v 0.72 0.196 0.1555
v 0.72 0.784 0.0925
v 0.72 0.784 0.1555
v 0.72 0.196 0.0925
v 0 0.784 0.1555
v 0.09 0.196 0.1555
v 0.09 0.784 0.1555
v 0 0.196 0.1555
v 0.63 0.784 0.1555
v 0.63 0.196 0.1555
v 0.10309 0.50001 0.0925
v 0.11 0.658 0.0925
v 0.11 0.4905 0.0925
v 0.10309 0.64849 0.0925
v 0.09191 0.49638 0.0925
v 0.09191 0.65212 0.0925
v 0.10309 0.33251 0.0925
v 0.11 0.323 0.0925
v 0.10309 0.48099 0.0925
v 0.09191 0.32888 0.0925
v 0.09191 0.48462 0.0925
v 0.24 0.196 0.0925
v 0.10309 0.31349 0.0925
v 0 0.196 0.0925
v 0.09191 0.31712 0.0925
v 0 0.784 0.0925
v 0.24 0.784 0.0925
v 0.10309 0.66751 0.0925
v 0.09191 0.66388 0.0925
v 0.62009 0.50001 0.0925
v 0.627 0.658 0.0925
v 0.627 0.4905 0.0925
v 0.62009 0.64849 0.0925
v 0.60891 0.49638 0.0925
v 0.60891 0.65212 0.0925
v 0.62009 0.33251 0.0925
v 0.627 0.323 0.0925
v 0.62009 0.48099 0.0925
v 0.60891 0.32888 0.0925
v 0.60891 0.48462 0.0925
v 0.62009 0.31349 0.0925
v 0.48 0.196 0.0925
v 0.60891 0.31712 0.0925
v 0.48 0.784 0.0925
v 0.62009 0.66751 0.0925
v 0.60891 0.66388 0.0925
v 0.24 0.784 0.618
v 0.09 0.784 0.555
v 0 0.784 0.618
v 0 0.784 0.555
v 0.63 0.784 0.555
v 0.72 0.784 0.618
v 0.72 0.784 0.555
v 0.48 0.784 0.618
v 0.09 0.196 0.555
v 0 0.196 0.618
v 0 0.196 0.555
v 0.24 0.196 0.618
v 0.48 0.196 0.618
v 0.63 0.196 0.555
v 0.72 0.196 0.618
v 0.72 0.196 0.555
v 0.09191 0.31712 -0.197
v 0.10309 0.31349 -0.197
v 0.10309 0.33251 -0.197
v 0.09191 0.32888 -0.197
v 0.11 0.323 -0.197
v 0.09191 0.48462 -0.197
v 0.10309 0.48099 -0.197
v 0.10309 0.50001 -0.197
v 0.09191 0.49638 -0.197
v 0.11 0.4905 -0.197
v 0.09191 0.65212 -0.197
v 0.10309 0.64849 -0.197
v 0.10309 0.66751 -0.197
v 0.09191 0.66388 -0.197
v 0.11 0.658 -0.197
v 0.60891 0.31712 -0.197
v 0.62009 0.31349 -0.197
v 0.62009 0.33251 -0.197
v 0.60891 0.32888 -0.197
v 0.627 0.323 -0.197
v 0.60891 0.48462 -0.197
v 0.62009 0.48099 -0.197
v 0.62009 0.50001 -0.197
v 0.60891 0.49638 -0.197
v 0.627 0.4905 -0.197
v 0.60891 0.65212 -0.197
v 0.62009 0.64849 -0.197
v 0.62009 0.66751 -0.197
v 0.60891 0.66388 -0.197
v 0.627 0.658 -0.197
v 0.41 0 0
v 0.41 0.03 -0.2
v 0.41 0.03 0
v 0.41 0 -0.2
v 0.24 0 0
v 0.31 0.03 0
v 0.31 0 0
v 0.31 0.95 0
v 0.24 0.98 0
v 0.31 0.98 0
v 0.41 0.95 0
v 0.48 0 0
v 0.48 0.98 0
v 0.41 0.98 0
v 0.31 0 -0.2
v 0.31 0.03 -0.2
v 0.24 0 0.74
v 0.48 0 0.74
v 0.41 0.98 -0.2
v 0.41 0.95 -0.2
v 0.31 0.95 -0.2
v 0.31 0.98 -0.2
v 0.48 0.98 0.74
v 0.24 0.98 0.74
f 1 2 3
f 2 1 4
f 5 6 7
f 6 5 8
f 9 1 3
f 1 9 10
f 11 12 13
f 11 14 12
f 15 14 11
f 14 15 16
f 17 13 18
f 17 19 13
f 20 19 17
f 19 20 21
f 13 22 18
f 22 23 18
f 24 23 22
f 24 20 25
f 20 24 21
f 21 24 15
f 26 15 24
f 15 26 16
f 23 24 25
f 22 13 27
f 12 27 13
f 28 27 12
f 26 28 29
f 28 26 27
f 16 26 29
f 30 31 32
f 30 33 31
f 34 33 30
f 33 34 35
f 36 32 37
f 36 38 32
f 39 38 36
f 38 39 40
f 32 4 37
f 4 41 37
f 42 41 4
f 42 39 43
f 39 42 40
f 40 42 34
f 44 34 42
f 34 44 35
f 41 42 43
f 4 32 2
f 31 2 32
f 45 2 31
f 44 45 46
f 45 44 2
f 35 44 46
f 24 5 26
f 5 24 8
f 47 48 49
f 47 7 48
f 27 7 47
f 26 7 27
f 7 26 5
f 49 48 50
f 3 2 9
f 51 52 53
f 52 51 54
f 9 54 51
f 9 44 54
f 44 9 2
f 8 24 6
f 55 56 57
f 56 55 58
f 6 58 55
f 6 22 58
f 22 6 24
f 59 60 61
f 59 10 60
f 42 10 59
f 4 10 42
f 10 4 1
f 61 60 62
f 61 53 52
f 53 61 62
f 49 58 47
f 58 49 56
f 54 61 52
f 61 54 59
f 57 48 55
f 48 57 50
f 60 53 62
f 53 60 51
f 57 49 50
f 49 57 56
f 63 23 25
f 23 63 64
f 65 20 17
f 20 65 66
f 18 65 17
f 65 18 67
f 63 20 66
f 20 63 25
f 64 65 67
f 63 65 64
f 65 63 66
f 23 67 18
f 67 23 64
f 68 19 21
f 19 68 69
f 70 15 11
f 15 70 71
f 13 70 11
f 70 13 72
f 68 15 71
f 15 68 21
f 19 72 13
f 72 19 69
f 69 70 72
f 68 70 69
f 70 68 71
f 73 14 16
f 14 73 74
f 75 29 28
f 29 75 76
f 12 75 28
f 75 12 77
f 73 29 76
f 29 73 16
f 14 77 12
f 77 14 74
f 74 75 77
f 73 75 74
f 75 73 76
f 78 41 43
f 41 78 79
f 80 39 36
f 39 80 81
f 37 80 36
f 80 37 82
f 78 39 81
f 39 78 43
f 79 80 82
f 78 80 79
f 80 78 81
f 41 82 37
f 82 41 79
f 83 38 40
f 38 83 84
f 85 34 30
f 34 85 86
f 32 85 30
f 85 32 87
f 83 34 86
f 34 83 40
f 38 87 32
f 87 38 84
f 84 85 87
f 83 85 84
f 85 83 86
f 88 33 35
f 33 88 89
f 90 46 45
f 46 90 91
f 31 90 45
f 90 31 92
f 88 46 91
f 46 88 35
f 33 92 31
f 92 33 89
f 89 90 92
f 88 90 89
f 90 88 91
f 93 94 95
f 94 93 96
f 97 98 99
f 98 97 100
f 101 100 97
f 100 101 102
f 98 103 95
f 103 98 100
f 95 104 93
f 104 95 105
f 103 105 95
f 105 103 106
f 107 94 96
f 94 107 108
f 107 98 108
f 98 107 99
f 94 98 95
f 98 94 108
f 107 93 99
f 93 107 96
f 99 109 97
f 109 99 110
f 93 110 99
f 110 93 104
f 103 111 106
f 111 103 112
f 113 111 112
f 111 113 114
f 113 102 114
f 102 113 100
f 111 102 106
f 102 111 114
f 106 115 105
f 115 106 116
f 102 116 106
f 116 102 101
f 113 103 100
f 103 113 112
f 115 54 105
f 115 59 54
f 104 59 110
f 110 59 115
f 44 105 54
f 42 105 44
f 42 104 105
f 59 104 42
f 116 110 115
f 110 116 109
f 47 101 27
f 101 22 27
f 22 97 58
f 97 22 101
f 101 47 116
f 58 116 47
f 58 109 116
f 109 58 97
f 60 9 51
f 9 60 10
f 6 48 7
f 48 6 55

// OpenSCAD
// 42TU transformer

dy = .1675;
dx = .517;

cx = 0.72;
cy = 0.98;
cz = 0.74;

module trans() {
  // body
  color("grey")
    translate( [cx/3, 0, 0])
      cube( [cx/3, cy, cz]);
  color("#e0e0e0") {
      translate( [0, cy/5, cz/8])  cube( [cx, cy*3/5, 0.063]);
      translate( [0, cy/5, cz*6/8])  cube( [cx, cy*3/5, 0.063]);
  }
  color("#ffffe0") {
    translate( [cx/8, cy/5, cz/8])  cube( [cx*3/4, cy*3/5, cz*5/8]);
  }

  // wires
  translate( [0.1, 0.323, -.197]) {
    for( ix=[0:1]) {
      for( iy=[0:2]) {
	translate( [ix*dx, iy*dy, 0])
	  cylinder( d=.02, h=.3);
      }
    }
  }

  // tabs
  color("#e0e0e0") {
    translate( [cx/2-.05, 0, -0.2])
      cube( [.1, .03, .2]);
    translate( [cx/2-.05, cy-.03, -0.2])
      cube( [.1, .03, .2]);
  }
}

trans();
